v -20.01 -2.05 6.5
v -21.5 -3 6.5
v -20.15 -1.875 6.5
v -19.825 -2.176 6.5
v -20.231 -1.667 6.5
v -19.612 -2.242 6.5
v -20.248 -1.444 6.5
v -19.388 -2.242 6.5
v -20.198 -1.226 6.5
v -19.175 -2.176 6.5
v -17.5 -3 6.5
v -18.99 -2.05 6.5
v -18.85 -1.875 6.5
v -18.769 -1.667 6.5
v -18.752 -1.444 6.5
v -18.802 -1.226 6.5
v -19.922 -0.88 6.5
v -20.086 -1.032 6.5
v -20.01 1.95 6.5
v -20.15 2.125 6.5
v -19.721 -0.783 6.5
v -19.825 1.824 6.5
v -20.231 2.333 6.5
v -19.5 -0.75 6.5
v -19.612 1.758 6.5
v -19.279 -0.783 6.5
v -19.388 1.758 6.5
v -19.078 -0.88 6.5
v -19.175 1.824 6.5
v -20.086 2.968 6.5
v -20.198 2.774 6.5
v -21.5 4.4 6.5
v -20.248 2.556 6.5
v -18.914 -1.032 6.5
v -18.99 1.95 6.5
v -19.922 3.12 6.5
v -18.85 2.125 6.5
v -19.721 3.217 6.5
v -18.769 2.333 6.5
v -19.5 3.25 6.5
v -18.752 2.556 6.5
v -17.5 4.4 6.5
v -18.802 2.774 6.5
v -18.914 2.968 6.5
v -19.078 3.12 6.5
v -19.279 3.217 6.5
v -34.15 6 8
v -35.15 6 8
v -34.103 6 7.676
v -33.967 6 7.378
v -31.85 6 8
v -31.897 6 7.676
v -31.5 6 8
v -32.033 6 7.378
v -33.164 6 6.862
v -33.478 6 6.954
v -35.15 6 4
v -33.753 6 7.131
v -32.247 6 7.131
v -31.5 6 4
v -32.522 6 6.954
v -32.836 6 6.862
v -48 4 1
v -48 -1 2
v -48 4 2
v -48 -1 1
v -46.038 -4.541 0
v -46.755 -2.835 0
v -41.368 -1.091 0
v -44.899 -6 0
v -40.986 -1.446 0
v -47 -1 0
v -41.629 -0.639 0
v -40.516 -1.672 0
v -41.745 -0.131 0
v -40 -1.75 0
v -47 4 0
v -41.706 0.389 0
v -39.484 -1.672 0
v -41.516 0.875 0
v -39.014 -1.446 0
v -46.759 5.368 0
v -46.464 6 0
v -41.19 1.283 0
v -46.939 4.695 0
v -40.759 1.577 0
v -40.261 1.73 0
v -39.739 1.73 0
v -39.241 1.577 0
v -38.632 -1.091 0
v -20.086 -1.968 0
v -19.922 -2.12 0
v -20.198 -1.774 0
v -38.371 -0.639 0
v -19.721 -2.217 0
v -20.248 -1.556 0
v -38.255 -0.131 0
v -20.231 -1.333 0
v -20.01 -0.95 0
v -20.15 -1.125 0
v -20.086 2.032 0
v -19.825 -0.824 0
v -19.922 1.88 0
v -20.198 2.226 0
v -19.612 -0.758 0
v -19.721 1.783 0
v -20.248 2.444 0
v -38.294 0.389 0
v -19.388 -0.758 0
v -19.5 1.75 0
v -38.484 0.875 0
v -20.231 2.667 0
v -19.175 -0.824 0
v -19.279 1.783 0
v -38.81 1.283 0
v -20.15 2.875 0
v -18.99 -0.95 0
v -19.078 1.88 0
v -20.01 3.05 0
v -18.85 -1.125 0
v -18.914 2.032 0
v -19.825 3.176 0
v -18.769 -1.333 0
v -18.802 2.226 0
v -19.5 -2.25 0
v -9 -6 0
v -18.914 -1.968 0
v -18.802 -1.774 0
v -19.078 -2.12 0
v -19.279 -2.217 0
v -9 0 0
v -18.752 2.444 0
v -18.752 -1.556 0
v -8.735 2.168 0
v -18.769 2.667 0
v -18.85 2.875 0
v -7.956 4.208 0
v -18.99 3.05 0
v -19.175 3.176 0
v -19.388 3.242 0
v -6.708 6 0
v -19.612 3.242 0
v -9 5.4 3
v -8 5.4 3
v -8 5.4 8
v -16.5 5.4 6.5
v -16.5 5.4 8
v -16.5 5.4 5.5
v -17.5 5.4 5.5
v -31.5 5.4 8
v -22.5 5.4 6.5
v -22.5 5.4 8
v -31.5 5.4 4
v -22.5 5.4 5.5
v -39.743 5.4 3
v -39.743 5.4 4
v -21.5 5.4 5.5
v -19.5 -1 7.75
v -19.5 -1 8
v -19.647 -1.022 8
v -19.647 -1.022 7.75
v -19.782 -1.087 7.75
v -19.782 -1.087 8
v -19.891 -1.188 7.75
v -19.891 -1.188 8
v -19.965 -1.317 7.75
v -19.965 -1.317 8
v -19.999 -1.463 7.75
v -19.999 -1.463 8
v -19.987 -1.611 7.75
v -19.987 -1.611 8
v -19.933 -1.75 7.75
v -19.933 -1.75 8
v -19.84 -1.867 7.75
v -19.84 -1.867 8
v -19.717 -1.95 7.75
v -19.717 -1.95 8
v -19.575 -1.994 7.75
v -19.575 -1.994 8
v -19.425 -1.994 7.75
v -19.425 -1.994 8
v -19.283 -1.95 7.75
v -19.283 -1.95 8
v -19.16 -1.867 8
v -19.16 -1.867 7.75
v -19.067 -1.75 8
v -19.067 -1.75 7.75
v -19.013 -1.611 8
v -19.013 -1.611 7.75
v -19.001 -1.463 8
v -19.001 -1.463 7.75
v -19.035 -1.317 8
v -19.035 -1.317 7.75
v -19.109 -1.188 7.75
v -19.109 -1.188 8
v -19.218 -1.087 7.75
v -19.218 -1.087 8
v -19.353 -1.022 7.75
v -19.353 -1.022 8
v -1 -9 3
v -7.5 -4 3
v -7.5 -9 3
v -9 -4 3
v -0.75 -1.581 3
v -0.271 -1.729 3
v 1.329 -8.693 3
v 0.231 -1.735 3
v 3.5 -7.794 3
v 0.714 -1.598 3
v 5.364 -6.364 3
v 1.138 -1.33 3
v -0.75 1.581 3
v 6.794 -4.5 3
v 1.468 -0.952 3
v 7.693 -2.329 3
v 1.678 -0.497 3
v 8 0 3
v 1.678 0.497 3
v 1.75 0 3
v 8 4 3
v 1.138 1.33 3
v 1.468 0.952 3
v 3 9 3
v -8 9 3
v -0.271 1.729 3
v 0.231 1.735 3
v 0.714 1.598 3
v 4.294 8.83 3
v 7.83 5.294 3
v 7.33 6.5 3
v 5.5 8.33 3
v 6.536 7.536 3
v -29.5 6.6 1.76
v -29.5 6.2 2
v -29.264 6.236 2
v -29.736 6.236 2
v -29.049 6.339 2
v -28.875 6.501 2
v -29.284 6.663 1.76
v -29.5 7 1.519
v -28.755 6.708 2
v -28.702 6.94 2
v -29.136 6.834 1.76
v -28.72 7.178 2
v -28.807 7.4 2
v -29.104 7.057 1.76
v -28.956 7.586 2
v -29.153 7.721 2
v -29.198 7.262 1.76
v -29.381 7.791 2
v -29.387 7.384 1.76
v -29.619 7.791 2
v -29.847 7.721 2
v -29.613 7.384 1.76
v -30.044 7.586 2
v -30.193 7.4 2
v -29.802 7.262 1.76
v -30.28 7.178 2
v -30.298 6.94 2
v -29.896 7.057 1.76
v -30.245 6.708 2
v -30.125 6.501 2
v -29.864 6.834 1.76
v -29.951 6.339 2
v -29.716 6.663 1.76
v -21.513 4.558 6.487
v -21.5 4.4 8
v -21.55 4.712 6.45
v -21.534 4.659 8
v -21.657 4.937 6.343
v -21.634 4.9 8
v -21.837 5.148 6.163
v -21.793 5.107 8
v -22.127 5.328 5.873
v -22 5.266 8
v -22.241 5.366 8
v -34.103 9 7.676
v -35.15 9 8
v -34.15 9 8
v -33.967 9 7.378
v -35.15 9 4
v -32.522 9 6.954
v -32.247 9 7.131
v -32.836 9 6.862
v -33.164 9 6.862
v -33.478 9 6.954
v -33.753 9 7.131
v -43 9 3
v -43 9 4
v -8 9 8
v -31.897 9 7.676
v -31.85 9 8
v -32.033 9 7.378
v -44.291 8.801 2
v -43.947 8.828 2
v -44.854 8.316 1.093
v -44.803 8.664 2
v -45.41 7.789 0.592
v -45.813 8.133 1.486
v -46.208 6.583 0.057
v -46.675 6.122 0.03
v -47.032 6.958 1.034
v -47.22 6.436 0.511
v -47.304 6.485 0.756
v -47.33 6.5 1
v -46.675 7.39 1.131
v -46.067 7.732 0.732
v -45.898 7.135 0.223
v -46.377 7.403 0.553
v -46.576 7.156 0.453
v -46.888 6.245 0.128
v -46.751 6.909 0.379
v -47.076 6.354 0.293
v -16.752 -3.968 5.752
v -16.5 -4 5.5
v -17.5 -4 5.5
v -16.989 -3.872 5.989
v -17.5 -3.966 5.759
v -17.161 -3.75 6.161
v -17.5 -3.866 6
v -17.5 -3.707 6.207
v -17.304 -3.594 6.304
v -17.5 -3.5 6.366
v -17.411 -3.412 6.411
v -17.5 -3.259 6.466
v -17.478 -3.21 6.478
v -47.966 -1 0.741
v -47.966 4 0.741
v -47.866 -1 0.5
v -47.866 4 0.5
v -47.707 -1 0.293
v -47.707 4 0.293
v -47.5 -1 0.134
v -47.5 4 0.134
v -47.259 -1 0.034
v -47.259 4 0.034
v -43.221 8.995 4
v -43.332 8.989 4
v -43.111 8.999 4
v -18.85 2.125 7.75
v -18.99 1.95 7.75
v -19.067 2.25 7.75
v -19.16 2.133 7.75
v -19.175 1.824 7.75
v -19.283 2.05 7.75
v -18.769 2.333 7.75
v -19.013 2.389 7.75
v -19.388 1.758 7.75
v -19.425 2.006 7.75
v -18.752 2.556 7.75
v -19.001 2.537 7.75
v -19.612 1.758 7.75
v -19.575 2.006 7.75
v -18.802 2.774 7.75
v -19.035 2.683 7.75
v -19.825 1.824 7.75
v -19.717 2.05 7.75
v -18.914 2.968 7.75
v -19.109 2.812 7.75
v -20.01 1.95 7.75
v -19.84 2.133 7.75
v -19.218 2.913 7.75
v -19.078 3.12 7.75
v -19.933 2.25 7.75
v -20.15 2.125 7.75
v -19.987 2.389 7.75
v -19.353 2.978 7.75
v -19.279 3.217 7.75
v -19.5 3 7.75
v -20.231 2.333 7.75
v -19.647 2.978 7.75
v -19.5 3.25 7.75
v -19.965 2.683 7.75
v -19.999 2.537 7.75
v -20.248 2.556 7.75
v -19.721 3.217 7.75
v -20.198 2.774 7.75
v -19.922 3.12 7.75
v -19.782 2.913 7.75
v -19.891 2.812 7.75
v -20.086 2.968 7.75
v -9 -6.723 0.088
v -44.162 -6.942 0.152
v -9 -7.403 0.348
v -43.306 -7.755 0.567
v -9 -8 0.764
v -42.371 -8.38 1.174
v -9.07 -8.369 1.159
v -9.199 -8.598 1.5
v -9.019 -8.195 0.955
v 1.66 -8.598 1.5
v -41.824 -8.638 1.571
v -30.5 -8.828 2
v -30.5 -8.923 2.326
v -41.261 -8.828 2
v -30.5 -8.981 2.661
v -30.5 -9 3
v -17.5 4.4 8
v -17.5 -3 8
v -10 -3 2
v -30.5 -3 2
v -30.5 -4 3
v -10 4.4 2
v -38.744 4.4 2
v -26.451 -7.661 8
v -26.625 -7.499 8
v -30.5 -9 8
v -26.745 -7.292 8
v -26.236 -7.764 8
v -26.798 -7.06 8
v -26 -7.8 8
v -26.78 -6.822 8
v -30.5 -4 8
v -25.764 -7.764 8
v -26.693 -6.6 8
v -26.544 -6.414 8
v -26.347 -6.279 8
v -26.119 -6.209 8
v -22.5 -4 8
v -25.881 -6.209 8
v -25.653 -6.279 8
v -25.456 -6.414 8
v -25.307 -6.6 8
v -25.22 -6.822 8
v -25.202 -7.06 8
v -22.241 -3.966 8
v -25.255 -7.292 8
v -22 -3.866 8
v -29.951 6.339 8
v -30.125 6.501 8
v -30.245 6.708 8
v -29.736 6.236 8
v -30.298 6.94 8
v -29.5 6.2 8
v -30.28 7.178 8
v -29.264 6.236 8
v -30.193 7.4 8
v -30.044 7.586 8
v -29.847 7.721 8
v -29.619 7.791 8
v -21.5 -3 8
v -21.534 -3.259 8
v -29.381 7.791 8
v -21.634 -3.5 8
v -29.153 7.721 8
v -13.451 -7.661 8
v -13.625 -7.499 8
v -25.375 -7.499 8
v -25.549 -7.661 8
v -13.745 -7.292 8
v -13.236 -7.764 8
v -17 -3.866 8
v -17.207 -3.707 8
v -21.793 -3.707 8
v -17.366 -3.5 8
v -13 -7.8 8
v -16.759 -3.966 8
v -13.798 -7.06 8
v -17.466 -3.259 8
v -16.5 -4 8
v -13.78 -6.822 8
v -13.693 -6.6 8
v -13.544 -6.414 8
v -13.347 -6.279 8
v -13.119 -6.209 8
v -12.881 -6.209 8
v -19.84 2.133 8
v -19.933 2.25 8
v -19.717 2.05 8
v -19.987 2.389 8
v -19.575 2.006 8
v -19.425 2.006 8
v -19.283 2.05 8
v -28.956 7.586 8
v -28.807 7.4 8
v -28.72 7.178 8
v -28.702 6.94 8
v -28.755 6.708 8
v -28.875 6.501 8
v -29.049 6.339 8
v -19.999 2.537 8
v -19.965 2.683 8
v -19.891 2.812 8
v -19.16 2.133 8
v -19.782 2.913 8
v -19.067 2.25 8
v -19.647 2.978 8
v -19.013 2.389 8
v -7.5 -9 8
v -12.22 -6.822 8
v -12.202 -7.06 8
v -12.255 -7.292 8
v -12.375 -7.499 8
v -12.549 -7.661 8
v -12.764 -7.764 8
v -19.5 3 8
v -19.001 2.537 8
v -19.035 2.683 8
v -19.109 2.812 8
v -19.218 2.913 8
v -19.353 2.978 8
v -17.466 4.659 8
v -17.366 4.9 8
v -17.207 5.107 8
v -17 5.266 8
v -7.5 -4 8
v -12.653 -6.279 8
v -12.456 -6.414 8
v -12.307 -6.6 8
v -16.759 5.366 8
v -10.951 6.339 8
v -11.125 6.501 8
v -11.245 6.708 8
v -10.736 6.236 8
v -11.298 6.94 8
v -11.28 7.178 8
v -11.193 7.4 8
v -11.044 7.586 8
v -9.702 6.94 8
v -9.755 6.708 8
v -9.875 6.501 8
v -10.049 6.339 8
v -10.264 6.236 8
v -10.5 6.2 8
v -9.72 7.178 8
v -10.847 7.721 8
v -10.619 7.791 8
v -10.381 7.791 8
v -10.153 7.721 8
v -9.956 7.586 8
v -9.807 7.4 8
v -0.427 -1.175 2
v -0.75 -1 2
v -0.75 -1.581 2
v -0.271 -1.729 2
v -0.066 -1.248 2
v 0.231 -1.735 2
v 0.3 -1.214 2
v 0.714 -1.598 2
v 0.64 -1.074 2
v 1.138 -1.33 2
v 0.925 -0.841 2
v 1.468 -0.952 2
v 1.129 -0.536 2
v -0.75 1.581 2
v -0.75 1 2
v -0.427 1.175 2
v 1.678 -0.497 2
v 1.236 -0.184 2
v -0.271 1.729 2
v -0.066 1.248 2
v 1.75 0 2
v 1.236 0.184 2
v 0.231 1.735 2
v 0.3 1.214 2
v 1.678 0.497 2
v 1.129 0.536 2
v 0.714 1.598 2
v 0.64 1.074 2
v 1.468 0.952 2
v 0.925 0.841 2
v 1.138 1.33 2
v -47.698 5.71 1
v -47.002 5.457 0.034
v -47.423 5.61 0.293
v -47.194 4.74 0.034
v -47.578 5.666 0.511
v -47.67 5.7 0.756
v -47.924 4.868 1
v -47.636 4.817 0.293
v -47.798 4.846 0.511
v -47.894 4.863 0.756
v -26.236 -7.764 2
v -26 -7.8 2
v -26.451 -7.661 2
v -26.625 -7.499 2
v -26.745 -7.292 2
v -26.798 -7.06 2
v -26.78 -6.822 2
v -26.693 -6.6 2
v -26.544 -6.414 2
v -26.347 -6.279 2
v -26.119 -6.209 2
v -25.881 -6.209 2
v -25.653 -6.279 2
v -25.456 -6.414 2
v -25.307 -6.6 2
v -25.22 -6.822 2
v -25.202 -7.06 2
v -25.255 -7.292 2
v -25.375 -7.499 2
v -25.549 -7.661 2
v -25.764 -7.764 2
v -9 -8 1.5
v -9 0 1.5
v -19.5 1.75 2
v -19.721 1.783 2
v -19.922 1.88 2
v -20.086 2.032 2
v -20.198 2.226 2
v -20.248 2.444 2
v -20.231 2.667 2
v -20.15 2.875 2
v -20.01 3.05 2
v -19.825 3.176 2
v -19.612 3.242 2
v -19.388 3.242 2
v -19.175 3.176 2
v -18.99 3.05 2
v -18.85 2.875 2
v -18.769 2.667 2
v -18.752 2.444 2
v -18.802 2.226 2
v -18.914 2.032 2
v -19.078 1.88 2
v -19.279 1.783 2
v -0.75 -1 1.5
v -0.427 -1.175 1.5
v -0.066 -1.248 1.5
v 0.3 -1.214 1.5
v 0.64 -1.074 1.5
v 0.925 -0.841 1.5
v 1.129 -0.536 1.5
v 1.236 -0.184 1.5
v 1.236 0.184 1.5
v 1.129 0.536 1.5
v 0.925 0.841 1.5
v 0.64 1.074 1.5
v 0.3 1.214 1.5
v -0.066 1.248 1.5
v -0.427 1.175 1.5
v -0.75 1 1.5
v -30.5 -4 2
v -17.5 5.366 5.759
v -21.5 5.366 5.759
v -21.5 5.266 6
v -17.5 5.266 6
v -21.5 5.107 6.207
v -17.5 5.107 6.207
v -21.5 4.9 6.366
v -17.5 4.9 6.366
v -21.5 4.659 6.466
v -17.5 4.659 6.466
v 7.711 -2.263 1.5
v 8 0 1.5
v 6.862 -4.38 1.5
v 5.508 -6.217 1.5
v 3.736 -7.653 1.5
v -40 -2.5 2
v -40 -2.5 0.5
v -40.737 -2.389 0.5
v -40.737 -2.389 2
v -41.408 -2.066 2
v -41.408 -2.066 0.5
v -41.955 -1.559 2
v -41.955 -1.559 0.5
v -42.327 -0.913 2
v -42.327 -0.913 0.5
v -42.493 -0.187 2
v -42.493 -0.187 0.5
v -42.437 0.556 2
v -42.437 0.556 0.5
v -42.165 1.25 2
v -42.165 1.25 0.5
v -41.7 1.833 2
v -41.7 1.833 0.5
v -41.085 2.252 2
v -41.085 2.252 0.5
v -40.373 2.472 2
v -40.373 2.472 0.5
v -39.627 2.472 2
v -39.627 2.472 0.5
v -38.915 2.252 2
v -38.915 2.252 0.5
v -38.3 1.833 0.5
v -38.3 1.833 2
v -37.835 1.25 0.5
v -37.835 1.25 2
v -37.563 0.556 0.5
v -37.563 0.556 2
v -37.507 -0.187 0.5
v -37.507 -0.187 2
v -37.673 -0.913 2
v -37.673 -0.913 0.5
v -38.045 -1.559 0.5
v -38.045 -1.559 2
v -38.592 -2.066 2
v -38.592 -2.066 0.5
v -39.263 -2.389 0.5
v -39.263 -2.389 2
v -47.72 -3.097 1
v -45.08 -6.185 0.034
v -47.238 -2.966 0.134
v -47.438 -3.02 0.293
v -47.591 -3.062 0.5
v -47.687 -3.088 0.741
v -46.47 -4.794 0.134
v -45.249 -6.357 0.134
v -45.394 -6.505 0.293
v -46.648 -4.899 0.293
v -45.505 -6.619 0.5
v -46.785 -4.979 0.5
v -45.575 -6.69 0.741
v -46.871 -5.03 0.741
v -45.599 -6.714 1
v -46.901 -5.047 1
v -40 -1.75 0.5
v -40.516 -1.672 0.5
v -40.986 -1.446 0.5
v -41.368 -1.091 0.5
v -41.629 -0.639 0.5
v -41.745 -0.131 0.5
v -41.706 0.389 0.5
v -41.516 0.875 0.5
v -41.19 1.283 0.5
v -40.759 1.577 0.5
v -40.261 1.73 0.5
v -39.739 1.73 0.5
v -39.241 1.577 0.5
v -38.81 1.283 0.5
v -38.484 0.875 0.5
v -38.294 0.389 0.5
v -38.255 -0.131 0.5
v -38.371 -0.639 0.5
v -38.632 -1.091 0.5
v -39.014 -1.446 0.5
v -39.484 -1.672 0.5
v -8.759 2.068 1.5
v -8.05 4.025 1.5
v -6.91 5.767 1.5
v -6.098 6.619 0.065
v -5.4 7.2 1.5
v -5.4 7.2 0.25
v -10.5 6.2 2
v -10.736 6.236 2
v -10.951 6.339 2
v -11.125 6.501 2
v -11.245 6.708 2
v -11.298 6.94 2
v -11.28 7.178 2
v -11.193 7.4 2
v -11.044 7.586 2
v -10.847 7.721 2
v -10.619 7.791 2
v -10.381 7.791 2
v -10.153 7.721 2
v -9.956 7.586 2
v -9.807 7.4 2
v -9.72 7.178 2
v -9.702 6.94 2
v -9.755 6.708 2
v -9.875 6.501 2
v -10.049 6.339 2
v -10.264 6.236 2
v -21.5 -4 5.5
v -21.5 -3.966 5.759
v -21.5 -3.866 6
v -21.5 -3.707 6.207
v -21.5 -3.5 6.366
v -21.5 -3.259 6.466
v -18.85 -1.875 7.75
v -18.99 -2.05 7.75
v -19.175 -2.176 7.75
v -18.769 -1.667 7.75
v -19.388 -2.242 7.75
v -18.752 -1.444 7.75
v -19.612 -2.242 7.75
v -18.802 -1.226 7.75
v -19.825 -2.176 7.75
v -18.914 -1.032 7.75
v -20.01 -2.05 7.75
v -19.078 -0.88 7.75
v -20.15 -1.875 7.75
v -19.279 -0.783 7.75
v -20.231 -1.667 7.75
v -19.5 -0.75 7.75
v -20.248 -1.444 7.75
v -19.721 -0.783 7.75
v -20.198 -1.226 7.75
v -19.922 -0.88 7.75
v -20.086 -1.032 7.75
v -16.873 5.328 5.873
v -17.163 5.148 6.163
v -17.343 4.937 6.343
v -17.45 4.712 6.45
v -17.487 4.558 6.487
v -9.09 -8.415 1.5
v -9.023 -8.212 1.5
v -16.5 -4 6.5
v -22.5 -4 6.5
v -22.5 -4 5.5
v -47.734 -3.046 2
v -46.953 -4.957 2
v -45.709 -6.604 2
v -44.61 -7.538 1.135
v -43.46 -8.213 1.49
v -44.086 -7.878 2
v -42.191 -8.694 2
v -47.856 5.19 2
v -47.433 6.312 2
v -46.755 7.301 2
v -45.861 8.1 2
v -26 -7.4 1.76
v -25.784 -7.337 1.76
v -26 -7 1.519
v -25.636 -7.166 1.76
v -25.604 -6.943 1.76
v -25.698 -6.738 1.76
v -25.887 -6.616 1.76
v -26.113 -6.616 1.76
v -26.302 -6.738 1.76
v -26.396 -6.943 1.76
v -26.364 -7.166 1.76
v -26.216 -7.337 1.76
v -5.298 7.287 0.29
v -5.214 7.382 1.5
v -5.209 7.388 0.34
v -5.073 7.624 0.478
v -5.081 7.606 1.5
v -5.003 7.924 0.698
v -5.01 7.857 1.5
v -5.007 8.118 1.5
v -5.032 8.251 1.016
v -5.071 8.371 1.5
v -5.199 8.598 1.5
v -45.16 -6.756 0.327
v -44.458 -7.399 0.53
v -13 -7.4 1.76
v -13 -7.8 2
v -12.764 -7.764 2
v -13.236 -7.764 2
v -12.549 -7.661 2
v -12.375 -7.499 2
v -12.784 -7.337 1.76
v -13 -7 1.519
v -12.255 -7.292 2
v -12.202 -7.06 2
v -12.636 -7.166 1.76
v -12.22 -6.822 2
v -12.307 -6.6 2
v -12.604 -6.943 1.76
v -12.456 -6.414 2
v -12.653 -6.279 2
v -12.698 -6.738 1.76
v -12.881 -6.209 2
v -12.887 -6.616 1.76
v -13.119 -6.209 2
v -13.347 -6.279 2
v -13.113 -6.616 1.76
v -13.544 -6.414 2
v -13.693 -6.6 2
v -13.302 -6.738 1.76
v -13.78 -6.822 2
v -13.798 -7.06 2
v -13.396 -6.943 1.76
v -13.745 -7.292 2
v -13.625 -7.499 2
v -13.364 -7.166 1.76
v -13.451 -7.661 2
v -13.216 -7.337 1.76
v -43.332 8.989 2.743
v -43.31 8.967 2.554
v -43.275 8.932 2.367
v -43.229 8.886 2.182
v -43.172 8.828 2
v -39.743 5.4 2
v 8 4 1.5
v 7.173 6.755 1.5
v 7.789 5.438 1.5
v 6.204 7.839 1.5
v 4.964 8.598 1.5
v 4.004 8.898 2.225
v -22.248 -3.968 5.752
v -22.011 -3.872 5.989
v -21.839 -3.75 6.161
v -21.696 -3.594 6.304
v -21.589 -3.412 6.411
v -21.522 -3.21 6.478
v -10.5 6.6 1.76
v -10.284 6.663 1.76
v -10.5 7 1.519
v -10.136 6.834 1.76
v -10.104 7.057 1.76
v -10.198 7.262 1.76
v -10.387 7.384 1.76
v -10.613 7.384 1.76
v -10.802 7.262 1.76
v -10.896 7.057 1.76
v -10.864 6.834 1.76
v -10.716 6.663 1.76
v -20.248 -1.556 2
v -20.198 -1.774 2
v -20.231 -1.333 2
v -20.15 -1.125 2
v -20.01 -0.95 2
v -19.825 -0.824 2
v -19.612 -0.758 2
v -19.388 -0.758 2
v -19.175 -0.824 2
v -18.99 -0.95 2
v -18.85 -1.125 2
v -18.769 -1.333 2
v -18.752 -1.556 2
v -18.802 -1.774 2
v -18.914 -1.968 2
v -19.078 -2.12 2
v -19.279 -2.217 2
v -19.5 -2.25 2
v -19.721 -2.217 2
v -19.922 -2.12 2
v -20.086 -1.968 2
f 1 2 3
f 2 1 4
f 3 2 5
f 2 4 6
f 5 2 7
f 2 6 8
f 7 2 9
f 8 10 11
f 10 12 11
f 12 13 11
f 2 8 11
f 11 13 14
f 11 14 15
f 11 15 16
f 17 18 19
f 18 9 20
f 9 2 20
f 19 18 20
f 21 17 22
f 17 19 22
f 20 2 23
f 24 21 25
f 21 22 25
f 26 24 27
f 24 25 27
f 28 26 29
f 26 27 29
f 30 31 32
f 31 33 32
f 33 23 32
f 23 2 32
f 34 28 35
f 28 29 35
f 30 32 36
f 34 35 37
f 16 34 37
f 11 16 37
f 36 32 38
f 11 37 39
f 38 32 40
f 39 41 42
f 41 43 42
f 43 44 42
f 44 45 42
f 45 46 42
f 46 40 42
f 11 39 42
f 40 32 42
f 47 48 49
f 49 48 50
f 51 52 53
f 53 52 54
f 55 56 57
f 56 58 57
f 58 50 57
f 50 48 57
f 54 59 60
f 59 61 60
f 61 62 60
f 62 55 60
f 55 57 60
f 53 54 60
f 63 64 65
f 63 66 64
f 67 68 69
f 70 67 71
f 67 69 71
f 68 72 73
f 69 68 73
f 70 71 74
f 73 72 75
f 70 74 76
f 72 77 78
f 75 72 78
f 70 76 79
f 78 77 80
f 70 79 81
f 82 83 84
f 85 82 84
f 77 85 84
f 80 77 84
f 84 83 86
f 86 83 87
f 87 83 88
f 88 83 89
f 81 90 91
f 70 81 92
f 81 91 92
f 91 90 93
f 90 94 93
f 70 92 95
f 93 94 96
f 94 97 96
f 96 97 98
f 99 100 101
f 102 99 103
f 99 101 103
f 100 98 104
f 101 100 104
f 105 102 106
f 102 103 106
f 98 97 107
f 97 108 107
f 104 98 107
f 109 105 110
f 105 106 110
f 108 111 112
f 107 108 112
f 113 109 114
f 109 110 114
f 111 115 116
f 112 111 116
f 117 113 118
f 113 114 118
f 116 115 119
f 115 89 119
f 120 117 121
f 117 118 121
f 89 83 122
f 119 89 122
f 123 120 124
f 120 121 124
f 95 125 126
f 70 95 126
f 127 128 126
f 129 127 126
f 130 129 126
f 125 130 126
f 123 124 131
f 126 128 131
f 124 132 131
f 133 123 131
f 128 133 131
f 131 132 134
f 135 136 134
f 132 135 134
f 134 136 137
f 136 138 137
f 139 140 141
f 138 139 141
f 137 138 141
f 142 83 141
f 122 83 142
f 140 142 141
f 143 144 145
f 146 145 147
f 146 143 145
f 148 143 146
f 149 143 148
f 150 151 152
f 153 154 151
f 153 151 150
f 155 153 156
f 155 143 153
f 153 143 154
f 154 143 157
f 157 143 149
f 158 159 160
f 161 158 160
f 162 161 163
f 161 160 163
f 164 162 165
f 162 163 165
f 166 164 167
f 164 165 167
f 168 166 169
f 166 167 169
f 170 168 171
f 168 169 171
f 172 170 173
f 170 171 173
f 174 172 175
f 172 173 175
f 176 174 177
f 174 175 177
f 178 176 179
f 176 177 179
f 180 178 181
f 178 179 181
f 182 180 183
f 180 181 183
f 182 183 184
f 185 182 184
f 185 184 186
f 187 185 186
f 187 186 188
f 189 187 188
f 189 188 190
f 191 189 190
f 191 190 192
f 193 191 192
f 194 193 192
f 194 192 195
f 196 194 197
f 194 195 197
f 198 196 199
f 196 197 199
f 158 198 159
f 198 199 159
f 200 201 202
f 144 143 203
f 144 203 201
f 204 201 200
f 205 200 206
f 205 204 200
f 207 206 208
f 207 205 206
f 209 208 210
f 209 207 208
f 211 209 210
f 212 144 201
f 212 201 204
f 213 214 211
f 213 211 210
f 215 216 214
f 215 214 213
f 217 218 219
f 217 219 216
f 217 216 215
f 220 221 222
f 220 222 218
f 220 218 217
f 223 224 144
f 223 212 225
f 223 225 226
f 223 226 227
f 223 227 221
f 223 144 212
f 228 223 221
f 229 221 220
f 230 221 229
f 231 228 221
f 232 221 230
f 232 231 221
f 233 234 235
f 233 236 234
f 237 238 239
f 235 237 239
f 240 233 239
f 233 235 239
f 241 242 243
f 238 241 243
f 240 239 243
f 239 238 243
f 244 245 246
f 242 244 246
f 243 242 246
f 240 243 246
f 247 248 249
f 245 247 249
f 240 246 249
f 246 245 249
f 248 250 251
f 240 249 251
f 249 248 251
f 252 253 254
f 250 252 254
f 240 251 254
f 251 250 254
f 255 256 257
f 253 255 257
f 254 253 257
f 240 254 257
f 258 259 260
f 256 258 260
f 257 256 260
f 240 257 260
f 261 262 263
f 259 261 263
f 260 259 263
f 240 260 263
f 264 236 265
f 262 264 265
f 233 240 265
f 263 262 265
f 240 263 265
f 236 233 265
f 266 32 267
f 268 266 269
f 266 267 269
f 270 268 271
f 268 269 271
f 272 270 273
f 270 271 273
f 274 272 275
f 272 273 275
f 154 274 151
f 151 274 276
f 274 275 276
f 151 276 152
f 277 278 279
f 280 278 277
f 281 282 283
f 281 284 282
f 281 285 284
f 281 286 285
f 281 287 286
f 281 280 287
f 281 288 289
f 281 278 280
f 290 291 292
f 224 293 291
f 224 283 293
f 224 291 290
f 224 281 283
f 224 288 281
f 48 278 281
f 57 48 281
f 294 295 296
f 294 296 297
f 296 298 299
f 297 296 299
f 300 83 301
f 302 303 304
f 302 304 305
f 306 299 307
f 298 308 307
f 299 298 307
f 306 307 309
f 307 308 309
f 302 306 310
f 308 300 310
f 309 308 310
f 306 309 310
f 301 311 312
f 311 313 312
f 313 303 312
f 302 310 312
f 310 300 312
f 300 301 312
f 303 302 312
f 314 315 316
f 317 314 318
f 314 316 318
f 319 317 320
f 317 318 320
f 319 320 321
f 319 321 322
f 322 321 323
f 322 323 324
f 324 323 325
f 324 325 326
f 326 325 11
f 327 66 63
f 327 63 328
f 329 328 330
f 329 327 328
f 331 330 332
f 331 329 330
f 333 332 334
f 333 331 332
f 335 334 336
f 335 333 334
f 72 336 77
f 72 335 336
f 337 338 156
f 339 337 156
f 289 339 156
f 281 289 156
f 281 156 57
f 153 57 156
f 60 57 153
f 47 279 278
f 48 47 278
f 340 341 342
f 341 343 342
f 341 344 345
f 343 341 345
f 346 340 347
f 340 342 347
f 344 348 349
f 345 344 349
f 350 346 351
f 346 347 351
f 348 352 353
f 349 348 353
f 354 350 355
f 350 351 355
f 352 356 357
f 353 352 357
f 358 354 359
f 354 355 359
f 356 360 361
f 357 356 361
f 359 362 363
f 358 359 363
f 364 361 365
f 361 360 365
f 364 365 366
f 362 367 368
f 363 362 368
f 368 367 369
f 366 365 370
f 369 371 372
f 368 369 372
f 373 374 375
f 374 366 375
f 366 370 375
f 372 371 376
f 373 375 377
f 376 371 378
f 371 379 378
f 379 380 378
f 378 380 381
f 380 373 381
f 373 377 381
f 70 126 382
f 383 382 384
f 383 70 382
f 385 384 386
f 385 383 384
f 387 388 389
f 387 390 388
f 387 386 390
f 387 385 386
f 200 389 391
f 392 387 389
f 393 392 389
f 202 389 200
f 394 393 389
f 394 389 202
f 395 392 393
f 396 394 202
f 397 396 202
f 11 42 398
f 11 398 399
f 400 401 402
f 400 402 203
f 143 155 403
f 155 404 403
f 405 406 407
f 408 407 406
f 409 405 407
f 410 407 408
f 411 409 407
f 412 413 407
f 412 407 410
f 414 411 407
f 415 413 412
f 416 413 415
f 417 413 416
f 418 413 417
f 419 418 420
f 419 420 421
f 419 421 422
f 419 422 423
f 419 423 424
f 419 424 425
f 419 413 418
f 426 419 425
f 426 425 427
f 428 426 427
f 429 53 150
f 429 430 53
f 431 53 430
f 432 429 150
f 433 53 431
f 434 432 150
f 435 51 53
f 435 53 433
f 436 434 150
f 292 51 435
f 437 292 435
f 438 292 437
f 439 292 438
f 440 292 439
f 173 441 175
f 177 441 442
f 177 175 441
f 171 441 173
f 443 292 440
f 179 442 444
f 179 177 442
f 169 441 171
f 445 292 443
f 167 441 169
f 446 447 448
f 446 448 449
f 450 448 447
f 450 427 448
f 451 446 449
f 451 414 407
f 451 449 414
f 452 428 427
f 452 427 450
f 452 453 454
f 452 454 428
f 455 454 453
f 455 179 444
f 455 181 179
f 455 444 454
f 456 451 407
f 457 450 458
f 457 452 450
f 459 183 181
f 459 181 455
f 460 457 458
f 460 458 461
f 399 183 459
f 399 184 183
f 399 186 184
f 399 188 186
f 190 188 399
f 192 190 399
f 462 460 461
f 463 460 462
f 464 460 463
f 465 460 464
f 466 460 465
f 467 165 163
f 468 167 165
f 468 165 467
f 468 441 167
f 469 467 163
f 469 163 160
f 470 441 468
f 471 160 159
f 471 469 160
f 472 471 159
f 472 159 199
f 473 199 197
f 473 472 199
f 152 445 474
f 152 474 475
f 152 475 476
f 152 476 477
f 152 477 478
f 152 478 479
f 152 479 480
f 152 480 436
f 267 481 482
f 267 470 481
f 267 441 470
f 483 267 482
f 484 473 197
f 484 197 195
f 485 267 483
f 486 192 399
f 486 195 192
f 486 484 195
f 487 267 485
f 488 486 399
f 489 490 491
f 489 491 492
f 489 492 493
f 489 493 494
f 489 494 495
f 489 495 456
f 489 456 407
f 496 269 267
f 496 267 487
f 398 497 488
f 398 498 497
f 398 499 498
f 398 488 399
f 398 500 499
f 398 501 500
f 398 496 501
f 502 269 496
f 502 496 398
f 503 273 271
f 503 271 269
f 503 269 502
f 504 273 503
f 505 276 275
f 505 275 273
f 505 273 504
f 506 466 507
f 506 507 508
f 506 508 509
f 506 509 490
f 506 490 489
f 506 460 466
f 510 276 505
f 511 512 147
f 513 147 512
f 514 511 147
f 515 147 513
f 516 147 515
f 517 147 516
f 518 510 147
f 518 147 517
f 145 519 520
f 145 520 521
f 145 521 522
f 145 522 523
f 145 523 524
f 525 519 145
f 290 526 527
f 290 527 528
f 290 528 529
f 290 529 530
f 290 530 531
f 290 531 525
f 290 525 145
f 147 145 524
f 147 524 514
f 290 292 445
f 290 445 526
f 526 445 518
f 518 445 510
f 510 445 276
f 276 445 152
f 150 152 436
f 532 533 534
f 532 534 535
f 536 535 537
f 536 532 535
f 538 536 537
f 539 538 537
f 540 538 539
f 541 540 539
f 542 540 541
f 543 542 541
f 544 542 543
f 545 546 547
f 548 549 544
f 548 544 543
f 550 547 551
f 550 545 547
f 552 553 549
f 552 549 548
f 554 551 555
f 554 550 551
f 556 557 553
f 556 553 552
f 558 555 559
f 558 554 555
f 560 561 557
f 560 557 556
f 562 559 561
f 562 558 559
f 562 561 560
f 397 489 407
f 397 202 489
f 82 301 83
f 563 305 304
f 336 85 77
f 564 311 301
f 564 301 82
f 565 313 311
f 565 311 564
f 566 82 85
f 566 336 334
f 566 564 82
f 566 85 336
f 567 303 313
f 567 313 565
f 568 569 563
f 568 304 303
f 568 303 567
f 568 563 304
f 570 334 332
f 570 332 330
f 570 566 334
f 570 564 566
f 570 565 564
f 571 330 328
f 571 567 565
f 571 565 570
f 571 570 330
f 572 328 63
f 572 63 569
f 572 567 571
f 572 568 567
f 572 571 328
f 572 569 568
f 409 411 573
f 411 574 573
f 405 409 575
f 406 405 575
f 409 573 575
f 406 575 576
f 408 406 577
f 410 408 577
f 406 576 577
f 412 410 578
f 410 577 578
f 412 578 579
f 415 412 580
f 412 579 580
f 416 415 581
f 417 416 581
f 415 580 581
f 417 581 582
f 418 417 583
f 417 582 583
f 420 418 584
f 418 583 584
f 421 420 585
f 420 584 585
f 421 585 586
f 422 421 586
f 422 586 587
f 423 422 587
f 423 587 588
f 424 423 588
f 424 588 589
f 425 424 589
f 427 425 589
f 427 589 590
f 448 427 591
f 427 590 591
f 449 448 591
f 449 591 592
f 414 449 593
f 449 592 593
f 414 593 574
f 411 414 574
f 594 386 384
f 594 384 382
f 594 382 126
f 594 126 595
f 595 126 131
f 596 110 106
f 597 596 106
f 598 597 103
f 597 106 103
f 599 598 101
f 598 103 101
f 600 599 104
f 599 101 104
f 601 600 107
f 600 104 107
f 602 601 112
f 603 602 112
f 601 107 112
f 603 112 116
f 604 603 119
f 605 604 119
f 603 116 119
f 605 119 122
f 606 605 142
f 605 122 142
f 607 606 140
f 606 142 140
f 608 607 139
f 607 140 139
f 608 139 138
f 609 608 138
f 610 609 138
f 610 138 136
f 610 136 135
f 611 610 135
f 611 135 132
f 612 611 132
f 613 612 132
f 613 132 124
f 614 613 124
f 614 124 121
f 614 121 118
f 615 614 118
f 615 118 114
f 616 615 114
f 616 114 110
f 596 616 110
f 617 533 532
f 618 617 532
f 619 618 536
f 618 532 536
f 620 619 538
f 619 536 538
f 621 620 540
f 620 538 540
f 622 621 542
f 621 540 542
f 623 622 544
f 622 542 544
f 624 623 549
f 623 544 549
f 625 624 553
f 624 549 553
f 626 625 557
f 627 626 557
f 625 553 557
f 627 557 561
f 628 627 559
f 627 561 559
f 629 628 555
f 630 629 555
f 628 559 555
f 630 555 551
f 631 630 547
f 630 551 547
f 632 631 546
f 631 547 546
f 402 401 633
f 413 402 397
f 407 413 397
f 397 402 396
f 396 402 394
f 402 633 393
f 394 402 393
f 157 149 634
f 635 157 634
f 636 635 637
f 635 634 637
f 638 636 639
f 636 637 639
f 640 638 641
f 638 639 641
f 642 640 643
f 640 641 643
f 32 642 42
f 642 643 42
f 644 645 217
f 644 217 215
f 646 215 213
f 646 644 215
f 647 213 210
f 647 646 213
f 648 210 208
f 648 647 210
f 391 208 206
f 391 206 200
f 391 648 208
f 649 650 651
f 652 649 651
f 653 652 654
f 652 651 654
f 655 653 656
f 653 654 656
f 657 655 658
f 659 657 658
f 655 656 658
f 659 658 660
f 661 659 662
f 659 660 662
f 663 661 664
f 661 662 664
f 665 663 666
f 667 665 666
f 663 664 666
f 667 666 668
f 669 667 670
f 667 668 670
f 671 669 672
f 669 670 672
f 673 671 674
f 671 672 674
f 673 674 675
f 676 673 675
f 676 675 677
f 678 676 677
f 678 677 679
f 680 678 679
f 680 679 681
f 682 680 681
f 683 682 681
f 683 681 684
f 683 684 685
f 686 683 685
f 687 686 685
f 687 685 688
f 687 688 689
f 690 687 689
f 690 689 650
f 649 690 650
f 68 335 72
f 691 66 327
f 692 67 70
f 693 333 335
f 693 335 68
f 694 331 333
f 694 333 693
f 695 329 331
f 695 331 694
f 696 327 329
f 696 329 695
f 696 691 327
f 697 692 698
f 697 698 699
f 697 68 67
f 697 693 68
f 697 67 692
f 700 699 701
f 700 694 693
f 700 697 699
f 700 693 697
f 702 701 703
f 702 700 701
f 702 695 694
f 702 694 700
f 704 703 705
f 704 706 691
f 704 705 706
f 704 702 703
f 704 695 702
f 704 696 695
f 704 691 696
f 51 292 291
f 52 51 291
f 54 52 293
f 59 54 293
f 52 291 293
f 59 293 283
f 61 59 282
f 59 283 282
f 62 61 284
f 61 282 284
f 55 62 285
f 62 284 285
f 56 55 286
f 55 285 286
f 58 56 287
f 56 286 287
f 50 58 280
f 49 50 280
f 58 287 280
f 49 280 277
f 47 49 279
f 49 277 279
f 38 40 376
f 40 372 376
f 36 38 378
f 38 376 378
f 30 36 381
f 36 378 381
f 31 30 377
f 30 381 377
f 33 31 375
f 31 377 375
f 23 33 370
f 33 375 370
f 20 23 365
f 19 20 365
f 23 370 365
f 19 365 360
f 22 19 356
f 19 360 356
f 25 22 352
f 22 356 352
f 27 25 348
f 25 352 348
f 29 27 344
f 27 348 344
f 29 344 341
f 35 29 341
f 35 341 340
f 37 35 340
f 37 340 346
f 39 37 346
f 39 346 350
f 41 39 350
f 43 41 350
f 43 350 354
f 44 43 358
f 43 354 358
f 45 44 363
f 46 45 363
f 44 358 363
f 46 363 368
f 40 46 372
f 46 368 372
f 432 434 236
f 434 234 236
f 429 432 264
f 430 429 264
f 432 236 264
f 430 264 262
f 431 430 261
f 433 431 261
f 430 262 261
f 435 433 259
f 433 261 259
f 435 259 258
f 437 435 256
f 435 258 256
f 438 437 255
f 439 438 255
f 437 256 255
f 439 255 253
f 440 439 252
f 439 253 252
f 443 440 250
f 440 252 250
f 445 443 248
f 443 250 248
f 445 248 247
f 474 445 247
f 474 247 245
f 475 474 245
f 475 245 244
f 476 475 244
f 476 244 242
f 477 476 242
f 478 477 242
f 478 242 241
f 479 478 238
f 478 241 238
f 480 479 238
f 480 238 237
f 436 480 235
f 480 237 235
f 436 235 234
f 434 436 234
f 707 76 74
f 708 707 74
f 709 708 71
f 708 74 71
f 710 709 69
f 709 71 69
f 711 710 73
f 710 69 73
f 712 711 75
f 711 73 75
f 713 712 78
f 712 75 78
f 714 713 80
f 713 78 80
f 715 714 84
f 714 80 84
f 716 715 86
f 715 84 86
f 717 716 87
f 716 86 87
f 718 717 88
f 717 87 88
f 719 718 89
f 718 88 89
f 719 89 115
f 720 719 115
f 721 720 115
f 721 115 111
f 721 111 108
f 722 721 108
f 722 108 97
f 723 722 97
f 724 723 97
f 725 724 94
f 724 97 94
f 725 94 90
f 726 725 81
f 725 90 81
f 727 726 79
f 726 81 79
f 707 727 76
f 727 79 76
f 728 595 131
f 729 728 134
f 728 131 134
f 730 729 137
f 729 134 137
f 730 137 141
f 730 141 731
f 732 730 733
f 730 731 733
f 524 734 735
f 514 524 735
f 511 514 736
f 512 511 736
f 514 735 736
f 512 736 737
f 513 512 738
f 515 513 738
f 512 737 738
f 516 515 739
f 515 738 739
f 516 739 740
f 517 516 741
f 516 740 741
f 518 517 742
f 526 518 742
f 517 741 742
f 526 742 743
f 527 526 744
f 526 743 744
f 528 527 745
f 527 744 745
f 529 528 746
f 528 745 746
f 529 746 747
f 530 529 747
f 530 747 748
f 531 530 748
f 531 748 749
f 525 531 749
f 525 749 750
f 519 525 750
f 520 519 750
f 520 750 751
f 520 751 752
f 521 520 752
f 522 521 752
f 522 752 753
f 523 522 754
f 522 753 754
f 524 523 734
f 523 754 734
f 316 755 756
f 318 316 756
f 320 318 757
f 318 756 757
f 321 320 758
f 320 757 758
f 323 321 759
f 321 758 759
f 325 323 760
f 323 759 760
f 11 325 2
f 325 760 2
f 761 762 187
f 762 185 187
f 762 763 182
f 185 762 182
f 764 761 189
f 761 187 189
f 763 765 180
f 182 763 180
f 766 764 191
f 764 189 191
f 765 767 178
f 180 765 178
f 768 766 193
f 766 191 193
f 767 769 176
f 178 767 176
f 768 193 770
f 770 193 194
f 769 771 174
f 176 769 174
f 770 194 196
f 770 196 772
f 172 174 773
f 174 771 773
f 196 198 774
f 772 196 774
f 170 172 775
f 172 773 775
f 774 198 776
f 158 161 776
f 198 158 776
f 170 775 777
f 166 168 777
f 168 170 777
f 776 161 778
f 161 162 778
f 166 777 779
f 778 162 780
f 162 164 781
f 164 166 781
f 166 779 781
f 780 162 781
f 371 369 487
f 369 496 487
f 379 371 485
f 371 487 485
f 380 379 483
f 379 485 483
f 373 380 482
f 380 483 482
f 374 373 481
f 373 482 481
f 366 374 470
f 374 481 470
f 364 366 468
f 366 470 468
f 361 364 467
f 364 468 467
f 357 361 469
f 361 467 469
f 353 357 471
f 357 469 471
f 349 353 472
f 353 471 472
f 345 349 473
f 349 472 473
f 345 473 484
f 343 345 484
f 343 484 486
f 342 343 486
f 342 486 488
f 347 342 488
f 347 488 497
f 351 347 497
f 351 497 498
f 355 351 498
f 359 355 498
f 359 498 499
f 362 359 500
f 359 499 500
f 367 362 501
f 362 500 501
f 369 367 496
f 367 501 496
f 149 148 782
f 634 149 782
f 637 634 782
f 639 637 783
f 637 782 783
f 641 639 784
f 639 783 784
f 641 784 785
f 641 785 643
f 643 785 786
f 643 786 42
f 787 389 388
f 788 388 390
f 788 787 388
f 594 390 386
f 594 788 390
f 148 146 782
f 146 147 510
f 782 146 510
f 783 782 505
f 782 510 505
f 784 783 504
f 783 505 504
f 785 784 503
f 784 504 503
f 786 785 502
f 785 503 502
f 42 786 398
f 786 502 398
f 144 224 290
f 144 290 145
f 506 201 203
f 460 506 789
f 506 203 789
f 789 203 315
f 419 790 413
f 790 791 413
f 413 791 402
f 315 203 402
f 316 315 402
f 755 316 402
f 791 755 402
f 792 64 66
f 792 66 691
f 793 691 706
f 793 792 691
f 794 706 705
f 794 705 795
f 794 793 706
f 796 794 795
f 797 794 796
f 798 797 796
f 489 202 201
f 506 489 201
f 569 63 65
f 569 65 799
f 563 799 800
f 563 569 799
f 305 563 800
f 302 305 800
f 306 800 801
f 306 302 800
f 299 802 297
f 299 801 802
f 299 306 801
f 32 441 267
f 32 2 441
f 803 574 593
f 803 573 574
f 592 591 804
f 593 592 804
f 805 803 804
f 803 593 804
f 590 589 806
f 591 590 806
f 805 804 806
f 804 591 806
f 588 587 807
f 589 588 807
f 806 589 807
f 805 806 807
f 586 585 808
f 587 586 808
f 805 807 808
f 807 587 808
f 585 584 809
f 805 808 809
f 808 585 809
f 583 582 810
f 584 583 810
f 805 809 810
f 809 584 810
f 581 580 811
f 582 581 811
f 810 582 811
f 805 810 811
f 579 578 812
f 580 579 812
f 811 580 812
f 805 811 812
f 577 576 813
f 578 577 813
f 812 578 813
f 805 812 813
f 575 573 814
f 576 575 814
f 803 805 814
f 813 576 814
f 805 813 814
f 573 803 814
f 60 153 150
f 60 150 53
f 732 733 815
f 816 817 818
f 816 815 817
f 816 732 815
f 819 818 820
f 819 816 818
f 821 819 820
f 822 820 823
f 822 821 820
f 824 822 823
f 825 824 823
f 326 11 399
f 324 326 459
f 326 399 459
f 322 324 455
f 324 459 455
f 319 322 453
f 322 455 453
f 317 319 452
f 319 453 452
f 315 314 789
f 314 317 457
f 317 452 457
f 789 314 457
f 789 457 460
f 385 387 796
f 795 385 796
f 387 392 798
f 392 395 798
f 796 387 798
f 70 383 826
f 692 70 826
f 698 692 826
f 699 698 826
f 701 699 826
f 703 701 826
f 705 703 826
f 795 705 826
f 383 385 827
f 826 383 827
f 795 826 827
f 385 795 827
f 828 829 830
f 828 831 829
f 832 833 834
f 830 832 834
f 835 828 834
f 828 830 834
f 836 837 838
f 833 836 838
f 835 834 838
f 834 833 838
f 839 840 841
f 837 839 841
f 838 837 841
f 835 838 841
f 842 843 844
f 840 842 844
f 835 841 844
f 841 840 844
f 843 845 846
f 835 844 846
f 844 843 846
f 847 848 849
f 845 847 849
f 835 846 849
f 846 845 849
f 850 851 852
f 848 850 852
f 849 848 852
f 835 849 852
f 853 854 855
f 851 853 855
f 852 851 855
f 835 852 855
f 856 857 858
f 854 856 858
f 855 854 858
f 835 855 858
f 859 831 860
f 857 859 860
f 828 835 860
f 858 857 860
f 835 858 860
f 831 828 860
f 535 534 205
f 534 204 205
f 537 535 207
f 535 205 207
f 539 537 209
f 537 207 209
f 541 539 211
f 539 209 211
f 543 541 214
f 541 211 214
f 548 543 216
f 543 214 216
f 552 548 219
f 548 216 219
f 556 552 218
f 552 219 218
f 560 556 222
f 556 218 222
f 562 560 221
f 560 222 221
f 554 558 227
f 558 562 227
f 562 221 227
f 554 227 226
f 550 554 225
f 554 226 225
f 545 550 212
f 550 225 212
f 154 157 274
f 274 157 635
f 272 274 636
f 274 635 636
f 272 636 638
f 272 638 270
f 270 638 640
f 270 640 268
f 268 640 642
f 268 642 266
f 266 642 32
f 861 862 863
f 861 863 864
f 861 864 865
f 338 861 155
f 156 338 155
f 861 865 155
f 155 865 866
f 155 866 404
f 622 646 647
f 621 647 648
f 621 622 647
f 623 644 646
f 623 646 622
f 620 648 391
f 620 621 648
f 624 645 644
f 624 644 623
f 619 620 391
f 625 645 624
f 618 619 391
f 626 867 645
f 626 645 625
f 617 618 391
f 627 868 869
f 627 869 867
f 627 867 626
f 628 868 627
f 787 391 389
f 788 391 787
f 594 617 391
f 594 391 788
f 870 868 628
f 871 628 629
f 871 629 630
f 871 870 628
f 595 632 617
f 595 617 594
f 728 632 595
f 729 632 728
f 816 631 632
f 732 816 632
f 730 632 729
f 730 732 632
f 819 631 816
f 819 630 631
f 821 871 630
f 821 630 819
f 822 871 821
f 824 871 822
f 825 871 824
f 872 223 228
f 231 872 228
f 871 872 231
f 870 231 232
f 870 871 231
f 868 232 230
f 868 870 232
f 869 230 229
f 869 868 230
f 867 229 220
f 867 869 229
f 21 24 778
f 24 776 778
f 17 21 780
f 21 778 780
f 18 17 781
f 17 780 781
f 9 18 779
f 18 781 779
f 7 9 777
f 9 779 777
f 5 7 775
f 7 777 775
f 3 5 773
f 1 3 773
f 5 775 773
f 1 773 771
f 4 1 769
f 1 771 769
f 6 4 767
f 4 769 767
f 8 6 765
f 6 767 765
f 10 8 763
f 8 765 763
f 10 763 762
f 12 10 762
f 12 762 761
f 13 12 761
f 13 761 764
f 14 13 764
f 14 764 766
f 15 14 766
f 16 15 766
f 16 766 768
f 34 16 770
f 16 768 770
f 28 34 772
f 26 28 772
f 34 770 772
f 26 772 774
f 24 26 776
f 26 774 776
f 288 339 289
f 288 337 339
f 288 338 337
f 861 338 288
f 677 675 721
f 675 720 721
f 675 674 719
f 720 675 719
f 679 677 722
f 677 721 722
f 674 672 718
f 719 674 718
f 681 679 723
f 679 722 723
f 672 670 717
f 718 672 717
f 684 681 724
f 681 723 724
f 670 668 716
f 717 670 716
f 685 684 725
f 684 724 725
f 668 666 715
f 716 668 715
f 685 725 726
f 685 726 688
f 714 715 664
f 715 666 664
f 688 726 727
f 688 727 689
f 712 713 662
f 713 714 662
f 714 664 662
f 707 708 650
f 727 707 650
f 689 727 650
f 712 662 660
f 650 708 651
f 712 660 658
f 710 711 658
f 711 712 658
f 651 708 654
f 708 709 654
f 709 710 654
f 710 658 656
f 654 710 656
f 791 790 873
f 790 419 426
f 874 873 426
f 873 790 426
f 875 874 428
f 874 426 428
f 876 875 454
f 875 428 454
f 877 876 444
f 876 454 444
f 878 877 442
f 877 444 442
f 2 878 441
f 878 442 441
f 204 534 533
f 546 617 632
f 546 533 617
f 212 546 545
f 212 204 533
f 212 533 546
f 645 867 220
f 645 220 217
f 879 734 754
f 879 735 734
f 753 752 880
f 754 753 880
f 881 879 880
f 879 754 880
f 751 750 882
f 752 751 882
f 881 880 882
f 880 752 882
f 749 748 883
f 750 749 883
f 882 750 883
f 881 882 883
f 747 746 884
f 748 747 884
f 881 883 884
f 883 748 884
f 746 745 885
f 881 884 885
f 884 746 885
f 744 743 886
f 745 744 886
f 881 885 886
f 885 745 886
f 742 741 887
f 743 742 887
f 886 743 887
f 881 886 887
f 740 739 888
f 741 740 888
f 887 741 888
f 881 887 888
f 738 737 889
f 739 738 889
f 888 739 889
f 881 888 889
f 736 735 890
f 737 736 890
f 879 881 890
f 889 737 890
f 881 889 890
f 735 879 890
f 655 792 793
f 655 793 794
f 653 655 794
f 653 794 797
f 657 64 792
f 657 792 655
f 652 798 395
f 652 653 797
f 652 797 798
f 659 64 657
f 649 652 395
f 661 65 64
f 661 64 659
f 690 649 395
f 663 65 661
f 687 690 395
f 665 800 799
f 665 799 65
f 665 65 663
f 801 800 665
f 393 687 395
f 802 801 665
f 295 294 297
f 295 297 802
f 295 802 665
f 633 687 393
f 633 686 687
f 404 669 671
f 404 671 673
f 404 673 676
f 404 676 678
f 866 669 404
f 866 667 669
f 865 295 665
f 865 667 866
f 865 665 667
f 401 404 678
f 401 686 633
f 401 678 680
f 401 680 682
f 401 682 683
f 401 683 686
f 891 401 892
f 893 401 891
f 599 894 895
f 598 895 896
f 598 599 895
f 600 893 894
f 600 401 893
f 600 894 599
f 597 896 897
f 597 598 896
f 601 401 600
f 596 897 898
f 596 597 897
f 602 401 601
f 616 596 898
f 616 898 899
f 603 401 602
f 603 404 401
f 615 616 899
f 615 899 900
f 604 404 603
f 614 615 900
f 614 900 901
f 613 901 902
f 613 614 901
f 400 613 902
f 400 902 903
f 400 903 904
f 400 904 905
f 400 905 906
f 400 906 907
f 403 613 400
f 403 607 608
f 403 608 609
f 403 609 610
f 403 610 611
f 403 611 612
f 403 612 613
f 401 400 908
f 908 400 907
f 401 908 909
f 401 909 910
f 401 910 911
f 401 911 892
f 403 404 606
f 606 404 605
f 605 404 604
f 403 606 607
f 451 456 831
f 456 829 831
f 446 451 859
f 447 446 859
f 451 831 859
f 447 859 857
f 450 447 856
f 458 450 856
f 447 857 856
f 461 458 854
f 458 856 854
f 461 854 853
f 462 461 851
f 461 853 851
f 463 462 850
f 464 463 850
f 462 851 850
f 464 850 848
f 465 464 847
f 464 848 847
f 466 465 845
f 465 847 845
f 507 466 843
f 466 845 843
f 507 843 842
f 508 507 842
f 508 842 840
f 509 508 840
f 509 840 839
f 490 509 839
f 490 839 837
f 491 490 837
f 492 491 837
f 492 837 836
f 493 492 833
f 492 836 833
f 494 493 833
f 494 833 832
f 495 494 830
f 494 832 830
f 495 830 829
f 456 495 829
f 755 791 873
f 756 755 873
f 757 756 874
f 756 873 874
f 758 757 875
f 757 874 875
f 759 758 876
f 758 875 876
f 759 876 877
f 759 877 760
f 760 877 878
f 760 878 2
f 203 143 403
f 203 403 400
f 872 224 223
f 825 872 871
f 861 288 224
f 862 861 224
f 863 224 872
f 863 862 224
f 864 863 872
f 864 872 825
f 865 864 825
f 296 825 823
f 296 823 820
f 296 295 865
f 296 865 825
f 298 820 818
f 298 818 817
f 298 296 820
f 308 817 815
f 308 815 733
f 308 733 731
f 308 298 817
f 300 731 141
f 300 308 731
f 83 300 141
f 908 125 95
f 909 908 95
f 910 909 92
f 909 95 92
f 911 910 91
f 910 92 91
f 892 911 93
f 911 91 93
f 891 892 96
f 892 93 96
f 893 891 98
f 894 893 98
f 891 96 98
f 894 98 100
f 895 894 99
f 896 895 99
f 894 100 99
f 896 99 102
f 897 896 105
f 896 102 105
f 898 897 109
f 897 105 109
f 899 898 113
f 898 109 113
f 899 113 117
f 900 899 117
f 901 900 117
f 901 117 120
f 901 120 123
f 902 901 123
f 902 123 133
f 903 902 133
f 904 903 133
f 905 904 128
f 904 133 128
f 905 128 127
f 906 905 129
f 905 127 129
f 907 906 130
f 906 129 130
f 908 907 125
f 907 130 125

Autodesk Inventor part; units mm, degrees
ref_plane "YZ Plane" through (0, 0, 0) normal (1, 0, 0) x (0, 1, 0)
ref_plane "XZ Plane" through (0, 0, 0) normal (0, 1, 0) x (-1, 0, 0)
ref_plane "XY Plane" through (0, 0, 0) normal (0, 0, 1) x (1, 0, 0)
sketch "axes" plane through (0, 0, 0) normal (0, 0, 1) x (1, 0, 0)
  point P0 (0, 0)
  point P1 (-40, 0)
  point P2 (0, 0)
  dimension "d0" = 40
sketch "tendon anchors" plane through (0, 0, 0) normal (0, 0, 1) x (1, 0, 0)
  line L0 (-8.2564, 0) -> (0, 0) construction
  line L1 (0, 0) -> (-7.5, -7.5) construction
  line L2 (-32.0254, 0) -> (-40, 0) construction
  line L3 (-40, 0) -> (-30.5, -5.5) construction
  dimension "d136" = 7.5
  dimension "d137" = 7.5
  dimension "d138" = 5.5
  dimension "d139" = 9.5
sketch "Sketch3" plane through (0, 0, 0) normal (0, 0, 1) x (1, 0, 0)
  line L0 (-48, 9) -> (8, 9)
  line L1 (8, 9) -> (8, -9)
  line L2 (8, -9) -> (-48, -9)
  line L3 (-48, -9) -> (-48, 9)
  point P0 (0, 0)
  point P1 (8, 0)
  point P2 (-40, 0)
  dimension "d1" = 18
  dimension "d2" = 8
  dimension "d3" = 8
extrude "base plate" add sketch "Sketch3" along normal blind 2
sketch "Sketch4" plane through (0, 0, 2) normal (0, 0, 1) x (1, 0, 0)
  line L0 (8, 9) -> (-48, 9) projected
  line L1 (-48, 9) -> (-48, -9) projected
  line L2 (-48, -9) -> (8, -9) projected
  line L3 (8, -9) -> (8, 9) projected
  line L4 (-31.5, 9) -> (-8, 9)
  line L5 (-8, 9) -> (-8, 5.4)
  line L6 (-8, 5.4) -> (-31.5, 5.4)
  line L7 (-31.5, 5.4) -> (-31.5, 9)
  line L8 (-30.5, -9) -> (-7.5, -9)
  line L9 (-7.5, -9) -> (-7.5, -4)
  line L10 (-7.5, -4) -> (-30.5, -4)
  line L11 (-30.5, -4) -> (-30.5, -9)
  point P0 (0, 0)
  point P1 (-30.5, -5.5)
  point P2 (-7.5, -7.5)
  dimension "d6" = 5
  dimension "d7" = 3.6
  dimension "d8" = 16.5
  dimension "d9" = 16
extrude "walls" add sketch "Sketch4" along normal blind 4.5 contours L5 L6 L7 L0 | L2 L11 L10 L9
sketch "Sketch5" plane through (0, 0, 2) normal (0, 0, 1) x (1, 0, 0)
  point P0 (0, 0)
  point P1 (-40, 0)
  point P2 (0, 0)
hole "joint bearings" at (-40, 0, 2) direction (0, 0, -1) diameter 3.5 end through all counterbore diameter 5 counterbore depth 1.5
fillet "front top" radius 5 1 edges at (-48, 9, 1)
fillet "front bottom" radius 8 1 edges at (-48, -9, 1)
sketch "Sketch7" plane through (0, 0, 2) normal (0, 0, 1) x (1, 0, 0)
  circle A0 centre (-40, 0) radius 4
  line L0 (-31.5, 9) -> (-43, 9) projected
  arc A1 (-43, 9) -> (-48, 4) centre (-43, 4) ccw projected
  line L1 (-31.5, 5.4) -> (-31.5, 9) projected
  line L2 (-43.3321, 8.989) -> (-37.1716, 2.8284)
  line L3 (-40, 0) -> (-52.831, 0) construction
  line L4 (-31.5, 5.4) -> (-39.7431, 5.4)
  point P0 (0, 0)
  dimension "d33" = 8
  dimension "d34" = 45
extrude "extension endstop" add sketch "Sketch7" along normal blind 2 contours L2 A1 L0 L1 L4
sketch "Sketch8" plane through (0, 0, 2) normal (0, 0, 1) x (1, 0, 0)
  point P0 (0, 0)
  point P1 (-40, 0)
  point P2 (-19.5, 2.5)
  point P3 (-19.5, 2.5)
  point P4 (-19.5, -1.5)
  dimension "d41" = 20.5
  dimension "d73" = 2.5
  dimension "d127" = 1.5
hole "spring pin" at (-19.5, 2.5, 2) at (-19.5, -1.5, 2) direction (0, 0, -1) diameter 1.5 end through all
sketch "Sketch10" plane through (0, 0, 2) normal (0, 0, 1) x (1, 0, 0)
  line L0 (-9, -9) -> (8, -9)
  line L1 (8, -9) -> (8, 9)
  line L2 (8, 9) -> (-9, 9)
  line L3 (-9, 9) -> (-9, -9)
  point P0 (0, 0)
  point P1 (-8, 9)
  dimension "d126" = 17
extrude "Extrusion4" add sketch "Sketch10" along normal blind 1
sketch "Sketch11" plane through (0, 0, 0) normal (0, 0, -1) x (-1, 0, 0)
  circle A0 centre (0, 0) radius 9
  line L0 (0, 9) -> (-9, 9)
  line L1 (-9, 9) -> (-9, -9)
  line L2 (-9, -9) -> (9, -9)
  line L3 (9, -9) -> (9, 0)
  dimension "d57" = 18
extrude "Extrusion5" cut sketch "Sketch11" against normal blind 1.5
fillet "Fillet5" radius 1 2 edges at (0, 9, 0.75) (-9, -9, 0.75)
fillet "Fillet6" radius 5 1 edges at (8, 9, 2.25)
fillet "Fillet7" radius 9 1 edges at (8, -9, 2.25)
sketch "Sketch12" plane through (0, 0, 3) normal (0, 0, 1) x (1, 0, 0)
  circle A0 centre (0, 0) radius 1.75
  line L0 (-0.75, -1.5811) -> (-0.75, 1.5811)
  dimension "d63" = 3.5
  dimension "d140" = 0.75
extrude "Extrusion6" cut sketch "Sketch12" against normal blind 1 contours A0 L0 picked at (0.0833, 0)
sketch "Sketch18" plane through (0, 0, 6.5) normal (0, 0, 1) x (1, 0, 0)
  line L0 (-31.5, 9) -> (-31.5, 5.4) projected
  line L1 (-31.5, 5.4) -> (-8, 5.4) projected
  line L2 (-8, 5.4) -> (-8, 9) projected
  line L3 (-8, 9) -> (-31.5, 9) projected
  line L4 (-30.5, -9) -> (-7.5, -9) projected
  line L5 (-7.5, -9) -> (-7.5, -4) projected
  line L6 (-7.5, -4) -> (-30.5, -4) projected
  line L7 (-30.5, -4) -> (-30.5, -9) projected
  circle A0 centre (-19.5, 2.5) radius 0.75 projected
  line L8 (-21.5, 5.4) -> (-17.5, 5.4)
  line L9 (-17.5, 5.4) -> (-17.5, -4)
  line L10 (-17.5, -4) -> (-21.5, -4)
  line L11 (-21.5, -4) -> (-21.5, 5.4)
  line L12 (-19.5, 2.5) -> (-19.5, -2.026) construction
  point P0 (0, 0)
  dimension "d105" = 4
extrude "Extrusion8" add sketch "Sketch18" along normal blind 1.5 contours L3 L2 L1 L0 | L1 L9 L6 L11 | L6 L5 L4 L7 | A0
sketch "Sketch19" plane through (0, 0, 6.5) normal (0, 0, -1) x (-1, 0, 0)
  circle A0 centre (19.5, 2.5) radius 0.75 projected
  circle A1 centre (19.5, -1.5) radius 0.75 projected
  point P0 (0, 0)
hole "spring pins support" at (-19.5, 2.5, 6.5) at (-19.5, -1.5, 6.5) direction (0, 0, 1) diameter 1 end through all counterbore diameter 1.5 counterbore depth 1.25
sketch "Sketch14" plane through (0, 0, 3) normal (0, 0, 1) x (1, 0, 0)
  line L0 (-0.75, -1.5811) -> (-0.75, 1.5811) projected
  arc A0 (-0.75, -1) -> (-0.75, 1) centre (0, 0) ccw
  dimension "d133" = 2.5
extrude "Extrusion11" cut sketch "Sketch14" against normal through all
sketch "Sketch17" plane through (0, 0, 8) normal (0, 0, 1) x (1, 0, 0)
  point P0 (0, 0)
  point P1 (-26, -7)
  point P2 (-13, -7)
  point P3 (-29.5, 7)
  point P4 (-10.5, 7)
  point P5 (-40, 0)
  point P6 (0, 0)
  point P7 (-40, 0)
  point P8 (0, 0)
  dimension "d92" = 7
  dimension "d93" = 7
  dimension "d94" = 10.5
  dimension "d95" = 10.5
  dimension "d96" = 14
  dimension "d97" = 13
hole "mounting" at (-29.5, 7, 8) at (-10.5, 7, 8) at (-26, -7, 8) at (-13, -7, 8) direction (0, 0, -1) diameter 1.6 depth 6 tip angle 118
sketch "Sketch20" plane through (-48, 4, 0) normal (-1, 0, 0) x (0, 0, 1)
  line L0 (3, 5) -> (20, 5)
  line L1 (20, 5) -> (20, -13)
  line L2 (20, -13) -> (3, -13)
  line L3 (0, -10) -> (0, 2)
  arc A0 (3, 5) -> (0, 2) centre (3, 2) ccw
  arc A1 (0, -10) -> (3, -13) centre (3, -10) ccw
  point P0 (0, -4)
  point P1 (0, 5)
  point P2 (0, -13)
  point P3 (0, -13)
  dimension "d115" = 20
  dimension "d116" = 3
extrude "side fillet" cut sketch "Sketch20" against normal through all keep common part
fillet "Fillet8" radius 1 5 edges at (-44.0048, -7.9255, 0.6994) (-48, 1.5, 0) (-47.8945, 5.0215, 0) (-46.0631, 7.9519, 0.7218) (-47.5485, -3.6495, 0)
sketch "Sketch21" plane through (-43, 9, 4) normal (0, 1, 0) x (1, 0, 0)
  line L0 (11.5, 0) -> (0, 0) projected
  line L1 (11.5, 0) -> (11.5, -4) projected
  line L2 (10, -4) -> (10, -4) construction
  line L3 (11.15, -4) -> (11.15, -4)
  line L4 (8.85, -4) -> (8.85, -4)
  arc A0 (8.85, -4) -> (11.15, -4) centre (10, -4) ccw
  arc A1 (11.15, -4) -> (8.85, -4) centre (10, -4) ccw
  line L5 (8.85, -4) -> (7.85, -4)
  line L6 (7.85, -4) -> (7.85, 0)
  line L7 (11.15, -4) -> (11.5, -4)
  point P0 (43, 4)
  point P1 (10, -3.75)
  point P2 (3, 4)
  dimension "d120" = 2.3
  dimension "d121" = 7
  dimension "d122" = 0
  dimension "d123" = 1
extrude "cable clip" add sketch "Sketch21" against normal blind 3 contours L1 L7 A1 L5 L6 L0
chamfer "Chamfer1" distance 1 angle 45 3 edges at (-9, 0.7, 2) (-24.3716, 5.4, 2) (-19.75, -4, 2)
fillet "Fillet9" radius 1 4 edges at (-21.5, 5.4, 7.25) (-17.5, 5.4, 7.25) (-17.5, -4, 7.25) (-21.5, -4, 7.25)
fillet "Fillet10" radius 1 4 edges at (-22, -4, 6.5) (-17, -4, 6.5) (-17, 5.4, 6.5) (-22, 5.4, 6.5)
equation "\"d0\" = MCP_PIP_length"
equation "\"d41\" = PIP_spring_length"
equation "\"MCP_PIP_length\" = F4_MCP_PIP_length"
equation "\"PIP_spring_length\" = F4_PIP_spring_length"
equation "\"F4_MCP_PIP_length\" = 40"
equation "\"F4_PIP_spring_length\" = 20.5"
properties part number "phalanx 1 R F4"
